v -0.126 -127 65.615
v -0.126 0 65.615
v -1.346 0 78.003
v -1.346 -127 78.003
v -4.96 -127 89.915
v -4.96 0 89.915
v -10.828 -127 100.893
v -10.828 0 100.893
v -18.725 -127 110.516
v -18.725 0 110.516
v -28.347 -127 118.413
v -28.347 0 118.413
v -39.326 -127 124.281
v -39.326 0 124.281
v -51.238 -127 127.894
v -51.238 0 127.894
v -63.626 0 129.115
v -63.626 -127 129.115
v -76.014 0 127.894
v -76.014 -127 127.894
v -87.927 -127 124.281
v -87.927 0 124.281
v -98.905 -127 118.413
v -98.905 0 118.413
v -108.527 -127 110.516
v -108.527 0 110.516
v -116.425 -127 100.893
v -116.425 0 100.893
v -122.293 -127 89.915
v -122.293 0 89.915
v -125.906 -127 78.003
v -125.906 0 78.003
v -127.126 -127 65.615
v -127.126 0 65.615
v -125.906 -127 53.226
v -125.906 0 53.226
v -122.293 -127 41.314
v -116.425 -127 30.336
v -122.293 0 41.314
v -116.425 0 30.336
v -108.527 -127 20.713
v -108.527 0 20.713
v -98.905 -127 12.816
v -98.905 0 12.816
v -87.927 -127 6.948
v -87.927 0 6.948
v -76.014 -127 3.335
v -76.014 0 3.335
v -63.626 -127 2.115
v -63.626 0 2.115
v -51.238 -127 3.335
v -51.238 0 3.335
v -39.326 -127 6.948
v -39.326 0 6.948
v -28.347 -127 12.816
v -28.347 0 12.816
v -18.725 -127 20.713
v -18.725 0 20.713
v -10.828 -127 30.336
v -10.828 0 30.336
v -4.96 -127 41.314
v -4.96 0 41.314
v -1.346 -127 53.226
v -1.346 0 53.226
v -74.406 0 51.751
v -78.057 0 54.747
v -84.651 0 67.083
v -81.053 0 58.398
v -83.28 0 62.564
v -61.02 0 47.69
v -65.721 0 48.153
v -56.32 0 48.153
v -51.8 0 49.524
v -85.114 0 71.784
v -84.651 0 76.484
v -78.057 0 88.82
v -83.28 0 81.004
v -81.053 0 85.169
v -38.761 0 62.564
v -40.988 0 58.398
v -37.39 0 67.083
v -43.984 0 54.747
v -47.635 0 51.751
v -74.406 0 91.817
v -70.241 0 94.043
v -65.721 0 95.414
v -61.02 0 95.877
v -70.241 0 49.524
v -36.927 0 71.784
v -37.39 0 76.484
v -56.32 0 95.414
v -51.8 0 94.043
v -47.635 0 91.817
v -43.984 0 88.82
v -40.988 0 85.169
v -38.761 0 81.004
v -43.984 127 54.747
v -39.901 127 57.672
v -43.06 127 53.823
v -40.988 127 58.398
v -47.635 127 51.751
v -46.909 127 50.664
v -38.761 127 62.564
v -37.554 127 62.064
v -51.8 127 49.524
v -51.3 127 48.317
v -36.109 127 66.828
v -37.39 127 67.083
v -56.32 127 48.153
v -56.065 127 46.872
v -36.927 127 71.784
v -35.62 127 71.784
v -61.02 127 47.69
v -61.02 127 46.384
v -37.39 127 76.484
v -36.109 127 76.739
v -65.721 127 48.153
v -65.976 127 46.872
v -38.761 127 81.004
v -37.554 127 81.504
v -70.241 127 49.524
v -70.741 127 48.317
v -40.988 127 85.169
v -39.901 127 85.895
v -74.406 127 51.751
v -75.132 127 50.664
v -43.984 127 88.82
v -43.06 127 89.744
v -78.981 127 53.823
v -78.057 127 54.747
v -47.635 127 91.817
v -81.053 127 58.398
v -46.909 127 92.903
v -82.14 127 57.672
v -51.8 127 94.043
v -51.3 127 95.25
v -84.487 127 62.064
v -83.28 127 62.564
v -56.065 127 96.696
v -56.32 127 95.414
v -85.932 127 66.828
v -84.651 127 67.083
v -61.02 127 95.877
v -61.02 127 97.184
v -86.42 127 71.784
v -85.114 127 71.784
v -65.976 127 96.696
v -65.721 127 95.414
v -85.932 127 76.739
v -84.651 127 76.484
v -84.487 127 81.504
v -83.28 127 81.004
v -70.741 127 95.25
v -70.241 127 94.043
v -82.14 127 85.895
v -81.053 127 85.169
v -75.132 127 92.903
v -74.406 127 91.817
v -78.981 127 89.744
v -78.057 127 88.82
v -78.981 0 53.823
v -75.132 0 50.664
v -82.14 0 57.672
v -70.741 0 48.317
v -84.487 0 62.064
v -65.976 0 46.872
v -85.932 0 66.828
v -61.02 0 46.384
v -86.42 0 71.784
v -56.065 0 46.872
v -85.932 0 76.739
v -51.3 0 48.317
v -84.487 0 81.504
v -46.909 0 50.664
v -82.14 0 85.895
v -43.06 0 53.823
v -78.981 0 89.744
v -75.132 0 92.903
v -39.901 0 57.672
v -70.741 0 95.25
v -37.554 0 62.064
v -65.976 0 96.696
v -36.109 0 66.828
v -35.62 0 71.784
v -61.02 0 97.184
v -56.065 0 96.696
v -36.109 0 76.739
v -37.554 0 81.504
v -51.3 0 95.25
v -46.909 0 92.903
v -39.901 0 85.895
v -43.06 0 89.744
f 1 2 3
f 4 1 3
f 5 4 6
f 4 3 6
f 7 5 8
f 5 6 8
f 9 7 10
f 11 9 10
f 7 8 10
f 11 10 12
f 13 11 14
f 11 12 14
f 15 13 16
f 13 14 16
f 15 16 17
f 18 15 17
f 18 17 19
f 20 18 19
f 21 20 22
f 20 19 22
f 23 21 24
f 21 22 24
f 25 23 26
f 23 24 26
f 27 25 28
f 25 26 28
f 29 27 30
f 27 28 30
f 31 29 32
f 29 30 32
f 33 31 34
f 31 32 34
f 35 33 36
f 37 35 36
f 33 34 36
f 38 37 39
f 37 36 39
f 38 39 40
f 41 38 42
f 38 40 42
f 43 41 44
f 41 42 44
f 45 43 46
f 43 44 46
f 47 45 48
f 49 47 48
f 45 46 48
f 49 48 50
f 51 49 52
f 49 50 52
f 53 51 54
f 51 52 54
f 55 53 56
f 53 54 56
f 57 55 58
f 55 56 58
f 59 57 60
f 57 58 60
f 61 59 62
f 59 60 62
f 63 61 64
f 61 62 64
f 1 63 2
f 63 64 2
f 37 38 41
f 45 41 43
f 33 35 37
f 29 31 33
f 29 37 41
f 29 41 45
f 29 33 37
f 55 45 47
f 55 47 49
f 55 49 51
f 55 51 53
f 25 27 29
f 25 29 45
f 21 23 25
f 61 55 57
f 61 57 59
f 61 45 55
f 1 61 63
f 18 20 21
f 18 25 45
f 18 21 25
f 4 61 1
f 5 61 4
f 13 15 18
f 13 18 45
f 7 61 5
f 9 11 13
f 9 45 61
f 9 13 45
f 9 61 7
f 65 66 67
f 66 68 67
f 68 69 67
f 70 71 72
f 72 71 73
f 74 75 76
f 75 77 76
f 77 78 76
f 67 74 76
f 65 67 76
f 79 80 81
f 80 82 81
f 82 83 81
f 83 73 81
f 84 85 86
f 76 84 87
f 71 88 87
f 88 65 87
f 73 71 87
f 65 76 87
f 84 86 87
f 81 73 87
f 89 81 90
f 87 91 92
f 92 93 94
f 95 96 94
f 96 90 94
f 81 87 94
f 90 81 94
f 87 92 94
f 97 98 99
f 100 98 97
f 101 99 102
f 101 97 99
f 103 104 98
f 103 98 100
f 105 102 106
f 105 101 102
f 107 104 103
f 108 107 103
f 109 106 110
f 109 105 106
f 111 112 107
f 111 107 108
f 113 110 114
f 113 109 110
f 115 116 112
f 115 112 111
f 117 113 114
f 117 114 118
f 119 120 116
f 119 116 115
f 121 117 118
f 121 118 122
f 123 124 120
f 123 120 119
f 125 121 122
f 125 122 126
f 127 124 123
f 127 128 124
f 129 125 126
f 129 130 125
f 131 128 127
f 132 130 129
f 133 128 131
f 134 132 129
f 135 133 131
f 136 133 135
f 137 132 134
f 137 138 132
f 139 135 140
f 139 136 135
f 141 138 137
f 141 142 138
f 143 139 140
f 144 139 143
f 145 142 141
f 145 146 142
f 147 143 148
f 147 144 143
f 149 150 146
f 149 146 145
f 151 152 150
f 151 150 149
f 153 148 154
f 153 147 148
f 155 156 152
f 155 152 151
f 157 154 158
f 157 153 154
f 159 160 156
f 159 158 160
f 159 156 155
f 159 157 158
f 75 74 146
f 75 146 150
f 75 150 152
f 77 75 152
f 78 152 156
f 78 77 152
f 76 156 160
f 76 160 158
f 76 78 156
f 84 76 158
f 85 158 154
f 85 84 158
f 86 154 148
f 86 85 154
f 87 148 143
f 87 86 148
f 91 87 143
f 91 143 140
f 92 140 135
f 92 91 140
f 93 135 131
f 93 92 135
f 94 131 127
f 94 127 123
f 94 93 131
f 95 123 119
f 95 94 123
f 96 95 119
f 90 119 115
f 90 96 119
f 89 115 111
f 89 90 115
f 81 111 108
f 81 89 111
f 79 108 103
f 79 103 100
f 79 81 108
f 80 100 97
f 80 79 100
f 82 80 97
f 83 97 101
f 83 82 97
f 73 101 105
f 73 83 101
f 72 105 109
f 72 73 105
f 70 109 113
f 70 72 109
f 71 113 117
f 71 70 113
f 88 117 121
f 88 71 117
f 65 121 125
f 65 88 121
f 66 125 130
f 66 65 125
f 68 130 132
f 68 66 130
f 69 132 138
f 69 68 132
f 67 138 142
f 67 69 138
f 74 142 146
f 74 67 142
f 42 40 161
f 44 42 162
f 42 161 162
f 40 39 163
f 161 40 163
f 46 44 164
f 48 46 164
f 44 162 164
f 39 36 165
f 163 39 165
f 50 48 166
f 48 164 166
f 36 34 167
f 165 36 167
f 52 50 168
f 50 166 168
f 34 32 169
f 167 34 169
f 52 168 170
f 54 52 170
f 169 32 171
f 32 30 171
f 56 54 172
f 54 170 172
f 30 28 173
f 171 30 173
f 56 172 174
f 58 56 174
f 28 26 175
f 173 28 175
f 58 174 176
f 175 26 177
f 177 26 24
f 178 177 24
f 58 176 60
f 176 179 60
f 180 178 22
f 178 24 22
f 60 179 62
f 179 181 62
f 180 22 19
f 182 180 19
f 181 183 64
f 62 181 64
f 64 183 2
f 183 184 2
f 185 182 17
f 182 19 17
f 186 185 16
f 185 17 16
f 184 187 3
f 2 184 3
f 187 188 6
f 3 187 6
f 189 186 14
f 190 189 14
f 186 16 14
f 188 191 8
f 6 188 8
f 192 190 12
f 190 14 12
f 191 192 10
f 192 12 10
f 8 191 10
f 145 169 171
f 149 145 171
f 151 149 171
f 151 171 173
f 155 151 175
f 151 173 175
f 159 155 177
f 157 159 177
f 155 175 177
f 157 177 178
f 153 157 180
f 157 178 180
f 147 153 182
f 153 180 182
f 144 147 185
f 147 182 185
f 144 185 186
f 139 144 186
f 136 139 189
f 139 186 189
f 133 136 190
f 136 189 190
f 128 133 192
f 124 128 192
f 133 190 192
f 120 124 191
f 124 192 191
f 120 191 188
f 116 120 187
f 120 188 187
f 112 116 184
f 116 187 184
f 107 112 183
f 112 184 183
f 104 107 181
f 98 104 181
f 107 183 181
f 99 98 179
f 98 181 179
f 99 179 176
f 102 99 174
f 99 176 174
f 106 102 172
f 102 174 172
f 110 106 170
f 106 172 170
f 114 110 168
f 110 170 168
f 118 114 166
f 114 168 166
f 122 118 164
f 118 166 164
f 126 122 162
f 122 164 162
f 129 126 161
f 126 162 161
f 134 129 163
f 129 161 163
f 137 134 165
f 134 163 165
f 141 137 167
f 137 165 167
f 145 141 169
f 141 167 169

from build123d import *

# Parameters (mm, degrees)
F0_R     = 63.5
F1_DEPTH = 127
F2_R     = 25.4
F2_R_2   = 24.093414
F3_DEPTH = 127


with BuildPart() as f1:
    # F0 (on Front) → F1 (new body)
    with BuildSketch(Plane.XZ):
        with Locations((-63.626207, 65.614522)):
            Circle(F0_R)
    extrude(amount=F1_DEPTH)

    # F2 (on face) → F3 (join)
    with BuildSketch(Plane(origin=(0, 0, 0), x_dir=(-1, 0, 0), z_dir=(0, 1, 0))):
        with Locations((61.020497, 71.783684)):
            Circle(F2_R)
        with Locations((61.020497, 71.783684)):
            Circle(F2_R_2, mode=Mode.SUBTRACT)
    extrude(amount=F3_DEPTH)


solid = f1.part
